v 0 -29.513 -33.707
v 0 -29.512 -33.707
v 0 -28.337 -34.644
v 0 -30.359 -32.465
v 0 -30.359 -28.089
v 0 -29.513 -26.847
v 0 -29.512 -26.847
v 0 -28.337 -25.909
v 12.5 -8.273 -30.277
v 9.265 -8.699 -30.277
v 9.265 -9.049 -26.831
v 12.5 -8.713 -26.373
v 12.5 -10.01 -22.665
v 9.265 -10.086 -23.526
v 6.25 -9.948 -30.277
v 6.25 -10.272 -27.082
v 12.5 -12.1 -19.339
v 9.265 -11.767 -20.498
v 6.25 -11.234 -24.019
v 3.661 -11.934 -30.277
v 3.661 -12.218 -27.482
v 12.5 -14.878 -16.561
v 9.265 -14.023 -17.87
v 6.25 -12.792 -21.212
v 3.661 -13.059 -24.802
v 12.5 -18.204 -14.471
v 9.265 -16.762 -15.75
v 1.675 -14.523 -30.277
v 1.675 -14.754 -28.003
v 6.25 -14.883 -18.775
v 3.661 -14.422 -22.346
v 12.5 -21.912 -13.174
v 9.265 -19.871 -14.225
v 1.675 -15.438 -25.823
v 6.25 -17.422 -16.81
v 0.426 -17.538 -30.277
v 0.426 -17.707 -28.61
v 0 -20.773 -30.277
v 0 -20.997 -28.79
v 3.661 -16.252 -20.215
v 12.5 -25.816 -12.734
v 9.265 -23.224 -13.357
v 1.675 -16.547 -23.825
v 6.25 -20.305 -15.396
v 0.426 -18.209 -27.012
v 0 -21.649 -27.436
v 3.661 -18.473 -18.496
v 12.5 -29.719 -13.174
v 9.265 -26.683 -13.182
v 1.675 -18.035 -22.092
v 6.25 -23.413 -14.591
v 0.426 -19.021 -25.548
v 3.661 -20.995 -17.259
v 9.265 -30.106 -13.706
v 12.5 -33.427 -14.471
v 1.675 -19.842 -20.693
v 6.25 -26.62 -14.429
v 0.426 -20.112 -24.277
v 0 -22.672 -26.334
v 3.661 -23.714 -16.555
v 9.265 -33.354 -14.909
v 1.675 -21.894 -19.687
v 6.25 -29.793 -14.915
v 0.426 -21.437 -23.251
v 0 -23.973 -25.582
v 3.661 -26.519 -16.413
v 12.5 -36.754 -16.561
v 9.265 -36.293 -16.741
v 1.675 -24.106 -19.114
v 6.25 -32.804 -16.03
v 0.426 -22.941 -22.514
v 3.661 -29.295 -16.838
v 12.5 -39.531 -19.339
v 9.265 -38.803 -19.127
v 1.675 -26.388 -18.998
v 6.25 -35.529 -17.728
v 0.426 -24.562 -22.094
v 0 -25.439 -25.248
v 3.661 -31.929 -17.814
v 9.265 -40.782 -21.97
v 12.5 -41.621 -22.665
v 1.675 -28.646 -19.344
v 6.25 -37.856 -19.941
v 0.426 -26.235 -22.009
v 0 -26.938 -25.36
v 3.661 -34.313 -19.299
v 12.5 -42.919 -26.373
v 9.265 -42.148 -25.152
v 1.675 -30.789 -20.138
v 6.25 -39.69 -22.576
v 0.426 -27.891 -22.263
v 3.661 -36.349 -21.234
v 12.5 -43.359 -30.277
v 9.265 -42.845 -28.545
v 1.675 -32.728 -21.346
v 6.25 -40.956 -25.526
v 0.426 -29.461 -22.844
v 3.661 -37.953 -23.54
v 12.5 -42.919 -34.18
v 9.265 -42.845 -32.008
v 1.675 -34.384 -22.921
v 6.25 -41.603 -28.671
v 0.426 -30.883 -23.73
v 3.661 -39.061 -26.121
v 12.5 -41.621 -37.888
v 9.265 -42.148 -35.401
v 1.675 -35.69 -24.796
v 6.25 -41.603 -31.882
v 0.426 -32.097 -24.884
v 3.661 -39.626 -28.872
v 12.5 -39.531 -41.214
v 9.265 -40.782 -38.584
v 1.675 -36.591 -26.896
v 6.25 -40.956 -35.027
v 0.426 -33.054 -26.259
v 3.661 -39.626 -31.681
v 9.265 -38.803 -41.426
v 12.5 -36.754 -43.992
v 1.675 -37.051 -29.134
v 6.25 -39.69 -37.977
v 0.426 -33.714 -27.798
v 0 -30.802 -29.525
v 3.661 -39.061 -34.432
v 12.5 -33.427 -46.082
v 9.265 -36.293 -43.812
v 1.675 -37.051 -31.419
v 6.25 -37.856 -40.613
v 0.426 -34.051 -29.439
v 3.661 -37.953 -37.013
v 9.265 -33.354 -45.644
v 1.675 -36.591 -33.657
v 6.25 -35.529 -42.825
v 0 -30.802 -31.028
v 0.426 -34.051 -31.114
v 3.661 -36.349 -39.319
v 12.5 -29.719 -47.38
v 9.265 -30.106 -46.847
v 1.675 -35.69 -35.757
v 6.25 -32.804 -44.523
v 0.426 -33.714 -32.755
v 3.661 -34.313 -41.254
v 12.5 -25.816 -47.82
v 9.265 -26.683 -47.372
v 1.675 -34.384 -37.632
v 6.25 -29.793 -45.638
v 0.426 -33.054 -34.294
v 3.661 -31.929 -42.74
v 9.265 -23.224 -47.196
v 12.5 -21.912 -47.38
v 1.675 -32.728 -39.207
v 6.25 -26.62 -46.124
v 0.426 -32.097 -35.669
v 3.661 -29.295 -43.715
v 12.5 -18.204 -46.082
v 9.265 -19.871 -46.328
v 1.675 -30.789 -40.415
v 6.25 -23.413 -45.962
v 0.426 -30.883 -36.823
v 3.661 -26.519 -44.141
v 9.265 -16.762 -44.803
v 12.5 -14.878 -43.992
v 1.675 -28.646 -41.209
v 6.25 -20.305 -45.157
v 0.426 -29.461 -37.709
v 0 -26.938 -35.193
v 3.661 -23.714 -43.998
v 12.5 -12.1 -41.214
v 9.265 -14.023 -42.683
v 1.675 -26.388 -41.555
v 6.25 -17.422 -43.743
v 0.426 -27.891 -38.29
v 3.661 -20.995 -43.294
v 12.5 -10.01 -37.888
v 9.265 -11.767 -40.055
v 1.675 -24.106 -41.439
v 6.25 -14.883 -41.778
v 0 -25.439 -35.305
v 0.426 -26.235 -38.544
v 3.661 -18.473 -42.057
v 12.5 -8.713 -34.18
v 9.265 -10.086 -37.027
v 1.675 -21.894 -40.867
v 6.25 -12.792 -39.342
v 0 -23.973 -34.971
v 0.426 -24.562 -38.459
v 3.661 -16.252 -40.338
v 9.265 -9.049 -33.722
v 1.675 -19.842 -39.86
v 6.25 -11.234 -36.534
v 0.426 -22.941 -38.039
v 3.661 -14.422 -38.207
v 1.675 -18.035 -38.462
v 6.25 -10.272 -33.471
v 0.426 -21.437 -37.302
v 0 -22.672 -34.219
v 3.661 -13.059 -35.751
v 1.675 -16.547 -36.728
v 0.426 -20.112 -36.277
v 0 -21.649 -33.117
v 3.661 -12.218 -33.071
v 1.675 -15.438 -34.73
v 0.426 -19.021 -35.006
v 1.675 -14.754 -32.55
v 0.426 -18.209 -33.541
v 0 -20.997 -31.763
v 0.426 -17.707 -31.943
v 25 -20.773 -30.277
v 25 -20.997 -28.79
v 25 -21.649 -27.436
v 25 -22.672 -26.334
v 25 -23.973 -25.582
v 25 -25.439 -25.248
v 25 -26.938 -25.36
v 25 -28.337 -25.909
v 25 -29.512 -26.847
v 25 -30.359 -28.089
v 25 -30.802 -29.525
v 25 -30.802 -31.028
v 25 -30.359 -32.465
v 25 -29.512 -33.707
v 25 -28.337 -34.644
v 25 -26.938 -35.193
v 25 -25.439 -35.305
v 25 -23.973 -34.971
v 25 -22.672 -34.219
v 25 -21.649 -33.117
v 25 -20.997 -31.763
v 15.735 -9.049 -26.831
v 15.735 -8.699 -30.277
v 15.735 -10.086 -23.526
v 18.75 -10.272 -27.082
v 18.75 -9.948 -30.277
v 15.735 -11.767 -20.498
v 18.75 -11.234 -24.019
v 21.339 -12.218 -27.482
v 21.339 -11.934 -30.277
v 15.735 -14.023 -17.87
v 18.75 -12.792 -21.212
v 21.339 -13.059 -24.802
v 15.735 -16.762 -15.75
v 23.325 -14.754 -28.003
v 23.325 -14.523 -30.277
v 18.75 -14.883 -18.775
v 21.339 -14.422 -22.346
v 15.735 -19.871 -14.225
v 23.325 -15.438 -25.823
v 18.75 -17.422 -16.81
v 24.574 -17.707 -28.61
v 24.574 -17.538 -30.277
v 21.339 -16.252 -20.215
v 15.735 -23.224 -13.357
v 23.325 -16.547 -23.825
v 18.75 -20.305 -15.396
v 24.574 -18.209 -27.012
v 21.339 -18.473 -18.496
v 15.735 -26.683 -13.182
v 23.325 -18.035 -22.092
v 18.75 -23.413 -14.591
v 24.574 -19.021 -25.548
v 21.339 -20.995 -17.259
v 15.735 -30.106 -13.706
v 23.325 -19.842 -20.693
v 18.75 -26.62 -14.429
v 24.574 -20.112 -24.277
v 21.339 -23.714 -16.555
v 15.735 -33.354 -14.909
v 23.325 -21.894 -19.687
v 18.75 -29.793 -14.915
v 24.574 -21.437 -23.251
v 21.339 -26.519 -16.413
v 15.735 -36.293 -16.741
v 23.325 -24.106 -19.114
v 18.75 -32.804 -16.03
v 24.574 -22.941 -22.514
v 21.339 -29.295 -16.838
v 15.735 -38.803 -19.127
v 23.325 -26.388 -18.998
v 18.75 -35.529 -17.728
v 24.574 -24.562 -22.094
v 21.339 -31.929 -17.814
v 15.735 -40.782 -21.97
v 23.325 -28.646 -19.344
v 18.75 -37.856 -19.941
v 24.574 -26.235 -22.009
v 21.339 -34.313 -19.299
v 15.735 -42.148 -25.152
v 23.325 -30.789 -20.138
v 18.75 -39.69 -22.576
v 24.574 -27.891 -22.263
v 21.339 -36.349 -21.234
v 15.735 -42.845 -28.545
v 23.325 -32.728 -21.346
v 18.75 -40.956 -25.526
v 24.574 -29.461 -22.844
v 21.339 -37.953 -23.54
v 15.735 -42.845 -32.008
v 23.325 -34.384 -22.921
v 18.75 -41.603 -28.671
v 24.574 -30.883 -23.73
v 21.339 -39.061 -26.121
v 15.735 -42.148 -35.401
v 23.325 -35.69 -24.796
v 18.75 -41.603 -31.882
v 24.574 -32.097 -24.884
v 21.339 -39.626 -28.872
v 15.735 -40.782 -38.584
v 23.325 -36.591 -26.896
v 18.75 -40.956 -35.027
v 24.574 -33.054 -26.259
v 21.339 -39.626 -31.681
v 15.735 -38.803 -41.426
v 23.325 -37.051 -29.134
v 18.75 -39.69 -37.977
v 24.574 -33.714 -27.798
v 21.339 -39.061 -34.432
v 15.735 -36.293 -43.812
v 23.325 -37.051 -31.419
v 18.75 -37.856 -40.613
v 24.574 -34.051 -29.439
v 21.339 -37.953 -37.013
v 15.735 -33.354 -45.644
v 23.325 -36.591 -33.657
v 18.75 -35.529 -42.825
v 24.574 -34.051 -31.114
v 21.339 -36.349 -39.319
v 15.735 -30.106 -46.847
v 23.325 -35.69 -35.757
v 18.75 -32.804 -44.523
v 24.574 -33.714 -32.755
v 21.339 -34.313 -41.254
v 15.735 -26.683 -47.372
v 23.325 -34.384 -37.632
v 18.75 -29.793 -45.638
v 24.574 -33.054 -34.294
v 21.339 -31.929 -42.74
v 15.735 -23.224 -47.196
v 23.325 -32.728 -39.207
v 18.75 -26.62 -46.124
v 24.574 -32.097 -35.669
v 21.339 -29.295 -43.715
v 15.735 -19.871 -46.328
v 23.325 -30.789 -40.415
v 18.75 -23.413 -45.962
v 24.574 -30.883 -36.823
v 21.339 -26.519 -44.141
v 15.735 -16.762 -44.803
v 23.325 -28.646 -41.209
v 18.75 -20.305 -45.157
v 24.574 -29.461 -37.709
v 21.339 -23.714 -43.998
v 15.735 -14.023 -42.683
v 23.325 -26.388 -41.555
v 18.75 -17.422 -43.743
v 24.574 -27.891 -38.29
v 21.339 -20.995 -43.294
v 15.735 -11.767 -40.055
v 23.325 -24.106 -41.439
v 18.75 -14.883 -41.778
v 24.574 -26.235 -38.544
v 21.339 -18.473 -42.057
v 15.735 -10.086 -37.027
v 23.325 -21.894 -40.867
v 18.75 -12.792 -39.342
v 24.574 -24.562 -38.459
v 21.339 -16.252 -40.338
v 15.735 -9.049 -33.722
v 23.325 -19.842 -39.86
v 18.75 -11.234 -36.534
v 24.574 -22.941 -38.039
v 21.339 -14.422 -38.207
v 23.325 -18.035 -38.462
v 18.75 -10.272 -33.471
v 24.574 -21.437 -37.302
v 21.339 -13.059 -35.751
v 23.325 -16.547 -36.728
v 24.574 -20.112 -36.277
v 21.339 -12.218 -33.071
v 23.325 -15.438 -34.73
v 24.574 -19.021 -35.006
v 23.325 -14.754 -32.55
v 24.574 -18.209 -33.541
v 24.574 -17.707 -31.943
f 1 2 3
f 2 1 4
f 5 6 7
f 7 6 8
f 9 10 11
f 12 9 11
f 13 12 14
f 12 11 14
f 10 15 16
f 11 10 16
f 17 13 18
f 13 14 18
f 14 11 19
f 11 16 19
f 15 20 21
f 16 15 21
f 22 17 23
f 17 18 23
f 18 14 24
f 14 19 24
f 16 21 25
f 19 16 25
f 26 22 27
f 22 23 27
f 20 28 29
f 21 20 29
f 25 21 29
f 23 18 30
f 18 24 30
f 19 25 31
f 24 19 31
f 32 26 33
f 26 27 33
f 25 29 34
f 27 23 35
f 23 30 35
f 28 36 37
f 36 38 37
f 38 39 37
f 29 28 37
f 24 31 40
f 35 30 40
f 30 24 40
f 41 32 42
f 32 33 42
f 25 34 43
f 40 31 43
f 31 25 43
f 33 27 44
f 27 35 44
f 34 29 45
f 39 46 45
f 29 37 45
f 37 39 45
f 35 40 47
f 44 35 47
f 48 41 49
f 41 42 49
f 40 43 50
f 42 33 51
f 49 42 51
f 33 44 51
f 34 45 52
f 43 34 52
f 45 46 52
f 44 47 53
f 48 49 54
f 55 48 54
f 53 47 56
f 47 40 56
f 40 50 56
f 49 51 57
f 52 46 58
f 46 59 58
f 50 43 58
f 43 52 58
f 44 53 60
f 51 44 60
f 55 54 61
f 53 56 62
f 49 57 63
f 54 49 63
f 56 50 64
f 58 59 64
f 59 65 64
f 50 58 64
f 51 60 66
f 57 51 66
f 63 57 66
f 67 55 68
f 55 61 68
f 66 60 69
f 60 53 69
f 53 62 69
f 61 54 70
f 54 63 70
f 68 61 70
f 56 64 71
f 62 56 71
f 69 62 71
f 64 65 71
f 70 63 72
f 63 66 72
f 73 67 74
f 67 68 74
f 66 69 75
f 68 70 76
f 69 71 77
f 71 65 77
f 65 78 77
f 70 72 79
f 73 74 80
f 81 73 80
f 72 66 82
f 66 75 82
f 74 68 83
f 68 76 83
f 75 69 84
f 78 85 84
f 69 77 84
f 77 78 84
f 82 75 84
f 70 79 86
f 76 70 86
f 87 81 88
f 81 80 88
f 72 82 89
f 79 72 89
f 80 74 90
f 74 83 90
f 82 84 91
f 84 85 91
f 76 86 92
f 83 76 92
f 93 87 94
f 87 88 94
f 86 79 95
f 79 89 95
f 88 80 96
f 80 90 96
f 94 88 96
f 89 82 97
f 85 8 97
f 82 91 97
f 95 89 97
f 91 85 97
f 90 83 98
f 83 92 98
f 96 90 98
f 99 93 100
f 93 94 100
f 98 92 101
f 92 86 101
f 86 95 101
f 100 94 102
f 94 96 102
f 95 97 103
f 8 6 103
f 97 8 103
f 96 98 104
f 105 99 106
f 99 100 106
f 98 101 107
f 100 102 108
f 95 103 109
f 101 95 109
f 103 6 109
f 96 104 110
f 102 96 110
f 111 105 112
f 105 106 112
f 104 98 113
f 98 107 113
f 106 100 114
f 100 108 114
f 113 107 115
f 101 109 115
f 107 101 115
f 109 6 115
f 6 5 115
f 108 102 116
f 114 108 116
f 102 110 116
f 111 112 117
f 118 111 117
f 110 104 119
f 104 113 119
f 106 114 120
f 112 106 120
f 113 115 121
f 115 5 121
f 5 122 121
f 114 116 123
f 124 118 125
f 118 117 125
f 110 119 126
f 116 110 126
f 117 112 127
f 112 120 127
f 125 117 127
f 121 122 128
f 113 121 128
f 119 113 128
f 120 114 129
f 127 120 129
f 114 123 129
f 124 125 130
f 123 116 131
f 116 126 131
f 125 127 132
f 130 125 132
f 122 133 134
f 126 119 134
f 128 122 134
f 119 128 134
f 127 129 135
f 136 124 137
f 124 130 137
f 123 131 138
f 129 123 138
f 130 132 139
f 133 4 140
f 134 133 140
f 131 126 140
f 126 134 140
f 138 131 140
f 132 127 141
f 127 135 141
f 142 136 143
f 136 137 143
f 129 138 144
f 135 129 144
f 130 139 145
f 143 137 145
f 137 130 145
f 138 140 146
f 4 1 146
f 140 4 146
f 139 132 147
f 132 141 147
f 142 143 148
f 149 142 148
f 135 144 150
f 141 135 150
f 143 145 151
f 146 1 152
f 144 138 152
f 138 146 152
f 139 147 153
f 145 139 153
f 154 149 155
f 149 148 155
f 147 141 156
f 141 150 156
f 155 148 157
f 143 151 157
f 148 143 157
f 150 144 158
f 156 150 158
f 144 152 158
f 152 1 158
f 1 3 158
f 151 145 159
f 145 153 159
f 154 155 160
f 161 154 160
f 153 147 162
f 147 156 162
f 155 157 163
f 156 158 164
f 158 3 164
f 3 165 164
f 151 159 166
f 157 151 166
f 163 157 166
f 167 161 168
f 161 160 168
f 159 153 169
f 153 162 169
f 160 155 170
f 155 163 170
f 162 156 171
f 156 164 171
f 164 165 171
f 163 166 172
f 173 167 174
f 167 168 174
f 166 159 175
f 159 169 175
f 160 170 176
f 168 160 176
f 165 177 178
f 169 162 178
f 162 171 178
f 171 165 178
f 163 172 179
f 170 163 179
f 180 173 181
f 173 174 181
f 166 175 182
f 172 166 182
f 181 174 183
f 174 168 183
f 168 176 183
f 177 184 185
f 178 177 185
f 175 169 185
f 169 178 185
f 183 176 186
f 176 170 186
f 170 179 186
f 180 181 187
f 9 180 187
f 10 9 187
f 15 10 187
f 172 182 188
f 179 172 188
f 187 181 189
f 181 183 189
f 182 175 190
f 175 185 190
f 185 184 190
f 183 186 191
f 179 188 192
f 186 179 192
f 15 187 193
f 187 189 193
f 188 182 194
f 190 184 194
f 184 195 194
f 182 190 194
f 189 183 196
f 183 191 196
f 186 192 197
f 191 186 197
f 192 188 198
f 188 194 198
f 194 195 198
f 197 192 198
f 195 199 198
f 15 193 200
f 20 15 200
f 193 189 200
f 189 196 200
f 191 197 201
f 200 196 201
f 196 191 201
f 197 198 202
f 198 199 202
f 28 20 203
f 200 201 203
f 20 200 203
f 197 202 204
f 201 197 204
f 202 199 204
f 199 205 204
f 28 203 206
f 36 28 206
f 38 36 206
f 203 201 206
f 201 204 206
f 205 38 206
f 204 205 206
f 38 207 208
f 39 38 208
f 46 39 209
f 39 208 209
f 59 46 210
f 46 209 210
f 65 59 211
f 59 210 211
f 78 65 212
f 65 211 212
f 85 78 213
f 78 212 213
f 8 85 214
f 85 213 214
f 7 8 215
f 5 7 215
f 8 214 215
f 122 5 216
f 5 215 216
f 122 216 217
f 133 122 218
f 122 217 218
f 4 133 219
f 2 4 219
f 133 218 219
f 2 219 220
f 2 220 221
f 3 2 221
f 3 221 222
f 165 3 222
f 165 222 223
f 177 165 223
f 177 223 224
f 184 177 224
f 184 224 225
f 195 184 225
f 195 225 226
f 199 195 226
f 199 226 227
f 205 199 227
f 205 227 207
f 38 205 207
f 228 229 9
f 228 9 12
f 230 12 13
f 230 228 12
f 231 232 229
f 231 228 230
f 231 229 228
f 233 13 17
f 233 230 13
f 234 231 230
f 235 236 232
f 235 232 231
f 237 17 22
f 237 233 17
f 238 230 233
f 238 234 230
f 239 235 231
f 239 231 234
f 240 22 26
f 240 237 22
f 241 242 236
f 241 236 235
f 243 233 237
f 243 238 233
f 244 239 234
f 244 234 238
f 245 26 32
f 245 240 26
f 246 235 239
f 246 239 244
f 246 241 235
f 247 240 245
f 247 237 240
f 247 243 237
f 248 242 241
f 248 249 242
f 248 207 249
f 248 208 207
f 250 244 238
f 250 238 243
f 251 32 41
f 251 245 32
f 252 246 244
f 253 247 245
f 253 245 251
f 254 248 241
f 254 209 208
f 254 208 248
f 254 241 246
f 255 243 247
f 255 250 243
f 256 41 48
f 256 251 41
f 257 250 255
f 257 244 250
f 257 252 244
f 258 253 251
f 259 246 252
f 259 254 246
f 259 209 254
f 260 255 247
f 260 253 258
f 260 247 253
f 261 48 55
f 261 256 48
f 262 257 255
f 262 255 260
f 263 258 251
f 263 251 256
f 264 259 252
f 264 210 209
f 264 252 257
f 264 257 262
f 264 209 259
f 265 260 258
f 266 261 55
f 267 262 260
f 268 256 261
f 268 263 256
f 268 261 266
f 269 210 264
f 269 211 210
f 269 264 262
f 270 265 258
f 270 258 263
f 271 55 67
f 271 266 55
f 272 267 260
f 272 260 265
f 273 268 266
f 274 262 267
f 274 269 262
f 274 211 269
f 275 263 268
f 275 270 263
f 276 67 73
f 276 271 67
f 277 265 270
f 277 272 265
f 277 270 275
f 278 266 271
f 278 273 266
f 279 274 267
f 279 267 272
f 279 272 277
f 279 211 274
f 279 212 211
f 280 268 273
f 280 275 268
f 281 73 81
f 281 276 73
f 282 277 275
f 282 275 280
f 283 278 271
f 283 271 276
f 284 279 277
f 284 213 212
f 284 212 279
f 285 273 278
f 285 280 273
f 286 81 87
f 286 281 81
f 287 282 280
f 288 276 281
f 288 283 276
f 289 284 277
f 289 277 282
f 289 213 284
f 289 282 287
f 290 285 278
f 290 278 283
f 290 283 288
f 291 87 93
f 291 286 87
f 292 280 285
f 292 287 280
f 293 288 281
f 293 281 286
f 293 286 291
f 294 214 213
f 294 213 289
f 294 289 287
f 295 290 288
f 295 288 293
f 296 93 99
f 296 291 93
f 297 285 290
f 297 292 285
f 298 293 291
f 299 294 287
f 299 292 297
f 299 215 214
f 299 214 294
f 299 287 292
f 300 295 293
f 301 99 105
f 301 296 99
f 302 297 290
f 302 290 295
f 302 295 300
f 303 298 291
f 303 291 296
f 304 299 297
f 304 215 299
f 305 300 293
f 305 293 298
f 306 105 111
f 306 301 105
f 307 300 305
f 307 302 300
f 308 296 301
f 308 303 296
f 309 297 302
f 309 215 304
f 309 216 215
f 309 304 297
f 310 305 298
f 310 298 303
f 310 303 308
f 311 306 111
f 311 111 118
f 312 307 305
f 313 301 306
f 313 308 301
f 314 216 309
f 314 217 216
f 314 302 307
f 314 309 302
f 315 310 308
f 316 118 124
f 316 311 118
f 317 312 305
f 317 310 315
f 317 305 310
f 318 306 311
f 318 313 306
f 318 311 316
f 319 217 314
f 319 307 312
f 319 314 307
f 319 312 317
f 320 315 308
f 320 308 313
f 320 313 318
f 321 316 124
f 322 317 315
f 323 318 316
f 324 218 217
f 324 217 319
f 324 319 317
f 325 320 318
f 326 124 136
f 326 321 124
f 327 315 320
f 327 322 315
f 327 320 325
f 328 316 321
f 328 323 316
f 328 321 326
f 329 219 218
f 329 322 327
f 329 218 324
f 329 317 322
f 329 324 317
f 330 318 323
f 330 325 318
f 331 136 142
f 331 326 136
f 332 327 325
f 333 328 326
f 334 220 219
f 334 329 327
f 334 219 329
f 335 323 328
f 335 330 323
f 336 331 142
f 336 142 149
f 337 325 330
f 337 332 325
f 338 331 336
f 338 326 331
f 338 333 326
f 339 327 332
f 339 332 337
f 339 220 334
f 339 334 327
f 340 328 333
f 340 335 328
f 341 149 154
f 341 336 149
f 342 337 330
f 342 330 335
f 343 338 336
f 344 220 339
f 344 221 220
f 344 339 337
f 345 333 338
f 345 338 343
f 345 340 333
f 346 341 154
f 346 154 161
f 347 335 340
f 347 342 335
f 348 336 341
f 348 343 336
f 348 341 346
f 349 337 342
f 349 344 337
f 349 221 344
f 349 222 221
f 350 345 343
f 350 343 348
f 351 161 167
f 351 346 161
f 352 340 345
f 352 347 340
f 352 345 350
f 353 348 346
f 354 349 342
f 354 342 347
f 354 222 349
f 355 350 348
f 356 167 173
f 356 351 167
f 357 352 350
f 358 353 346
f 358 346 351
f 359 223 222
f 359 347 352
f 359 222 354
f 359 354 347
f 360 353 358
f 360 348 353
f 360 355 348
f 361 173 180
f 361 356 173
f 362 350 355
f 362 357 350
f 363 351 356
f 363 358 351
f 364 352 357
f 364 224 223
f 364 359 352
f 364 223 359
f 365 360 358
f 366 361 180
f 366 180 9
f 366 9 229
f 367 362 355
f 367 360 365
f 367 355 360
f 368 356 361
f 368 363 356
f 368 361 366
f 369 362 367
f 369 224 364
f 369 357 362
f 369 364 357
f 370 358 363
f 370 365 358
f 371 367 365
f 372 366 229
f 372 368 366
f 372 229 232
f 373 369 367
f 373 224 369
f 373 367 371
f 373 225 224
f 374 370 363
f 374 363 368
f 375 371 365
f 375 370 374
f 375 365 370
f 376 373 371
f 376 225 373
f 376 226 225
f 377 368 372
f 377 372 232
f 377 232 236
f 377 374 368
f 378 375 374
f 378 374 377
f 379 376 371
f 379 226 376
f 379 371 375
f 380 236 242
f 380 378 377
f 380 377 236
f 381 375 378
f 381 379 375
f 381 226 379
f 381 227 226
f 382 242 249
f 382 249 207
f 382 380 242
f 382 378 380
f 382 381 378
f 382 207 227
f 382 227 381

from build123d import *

# Parameters (mm, degrees)
F0_R     = 17.5428851577
F1_DEPTH = 25
F2_R     = 12.5
F3_R     = 12.49999
F4_DEPTH = 25.001


# Not quite as in the source:
# - a fillet or chamfer is up to 0.001 mm smaller than in the source, because OpenCascade refuses the exact size


with BuildPart() as f1:
    # F0 (on Right) → F1 (new body)
    with BuildSketch(Plane.YZ):
        with Locations((-25.815801695, -30.2766188979)):
            Circle(F0_R)
    extrude(amount=F1_DEPTH)

    # F2
    f2_edges = [f1.edges().sort_by_distance(p)[0] for p in [
        (25, -43.358687, -30.276619),
    ]]
    fillet(f2_edges, radius=F2_R)

    # F3 (radius 12.5 in the source; OpenCascade refuses exactly that, so slightly less here)
    f3_edges = [f1.edges().sort_by_distance(p)[0] for p in [
        (0, -43.358687, -30.276619),
    ]]
    fillet(f3_edges, radius=F3_R)

    # F4 (cut, through all): a face of the model
    f4_faces = [f1.faces().sort_by_distance(p)[0] for p in [
        (25, -25.815801695, -30.2766188979),
    ]]
    extrude(f4_faces, amount=-F4_DEPTH, mode=Mode.SUBTRACT)


solid = f1.part
